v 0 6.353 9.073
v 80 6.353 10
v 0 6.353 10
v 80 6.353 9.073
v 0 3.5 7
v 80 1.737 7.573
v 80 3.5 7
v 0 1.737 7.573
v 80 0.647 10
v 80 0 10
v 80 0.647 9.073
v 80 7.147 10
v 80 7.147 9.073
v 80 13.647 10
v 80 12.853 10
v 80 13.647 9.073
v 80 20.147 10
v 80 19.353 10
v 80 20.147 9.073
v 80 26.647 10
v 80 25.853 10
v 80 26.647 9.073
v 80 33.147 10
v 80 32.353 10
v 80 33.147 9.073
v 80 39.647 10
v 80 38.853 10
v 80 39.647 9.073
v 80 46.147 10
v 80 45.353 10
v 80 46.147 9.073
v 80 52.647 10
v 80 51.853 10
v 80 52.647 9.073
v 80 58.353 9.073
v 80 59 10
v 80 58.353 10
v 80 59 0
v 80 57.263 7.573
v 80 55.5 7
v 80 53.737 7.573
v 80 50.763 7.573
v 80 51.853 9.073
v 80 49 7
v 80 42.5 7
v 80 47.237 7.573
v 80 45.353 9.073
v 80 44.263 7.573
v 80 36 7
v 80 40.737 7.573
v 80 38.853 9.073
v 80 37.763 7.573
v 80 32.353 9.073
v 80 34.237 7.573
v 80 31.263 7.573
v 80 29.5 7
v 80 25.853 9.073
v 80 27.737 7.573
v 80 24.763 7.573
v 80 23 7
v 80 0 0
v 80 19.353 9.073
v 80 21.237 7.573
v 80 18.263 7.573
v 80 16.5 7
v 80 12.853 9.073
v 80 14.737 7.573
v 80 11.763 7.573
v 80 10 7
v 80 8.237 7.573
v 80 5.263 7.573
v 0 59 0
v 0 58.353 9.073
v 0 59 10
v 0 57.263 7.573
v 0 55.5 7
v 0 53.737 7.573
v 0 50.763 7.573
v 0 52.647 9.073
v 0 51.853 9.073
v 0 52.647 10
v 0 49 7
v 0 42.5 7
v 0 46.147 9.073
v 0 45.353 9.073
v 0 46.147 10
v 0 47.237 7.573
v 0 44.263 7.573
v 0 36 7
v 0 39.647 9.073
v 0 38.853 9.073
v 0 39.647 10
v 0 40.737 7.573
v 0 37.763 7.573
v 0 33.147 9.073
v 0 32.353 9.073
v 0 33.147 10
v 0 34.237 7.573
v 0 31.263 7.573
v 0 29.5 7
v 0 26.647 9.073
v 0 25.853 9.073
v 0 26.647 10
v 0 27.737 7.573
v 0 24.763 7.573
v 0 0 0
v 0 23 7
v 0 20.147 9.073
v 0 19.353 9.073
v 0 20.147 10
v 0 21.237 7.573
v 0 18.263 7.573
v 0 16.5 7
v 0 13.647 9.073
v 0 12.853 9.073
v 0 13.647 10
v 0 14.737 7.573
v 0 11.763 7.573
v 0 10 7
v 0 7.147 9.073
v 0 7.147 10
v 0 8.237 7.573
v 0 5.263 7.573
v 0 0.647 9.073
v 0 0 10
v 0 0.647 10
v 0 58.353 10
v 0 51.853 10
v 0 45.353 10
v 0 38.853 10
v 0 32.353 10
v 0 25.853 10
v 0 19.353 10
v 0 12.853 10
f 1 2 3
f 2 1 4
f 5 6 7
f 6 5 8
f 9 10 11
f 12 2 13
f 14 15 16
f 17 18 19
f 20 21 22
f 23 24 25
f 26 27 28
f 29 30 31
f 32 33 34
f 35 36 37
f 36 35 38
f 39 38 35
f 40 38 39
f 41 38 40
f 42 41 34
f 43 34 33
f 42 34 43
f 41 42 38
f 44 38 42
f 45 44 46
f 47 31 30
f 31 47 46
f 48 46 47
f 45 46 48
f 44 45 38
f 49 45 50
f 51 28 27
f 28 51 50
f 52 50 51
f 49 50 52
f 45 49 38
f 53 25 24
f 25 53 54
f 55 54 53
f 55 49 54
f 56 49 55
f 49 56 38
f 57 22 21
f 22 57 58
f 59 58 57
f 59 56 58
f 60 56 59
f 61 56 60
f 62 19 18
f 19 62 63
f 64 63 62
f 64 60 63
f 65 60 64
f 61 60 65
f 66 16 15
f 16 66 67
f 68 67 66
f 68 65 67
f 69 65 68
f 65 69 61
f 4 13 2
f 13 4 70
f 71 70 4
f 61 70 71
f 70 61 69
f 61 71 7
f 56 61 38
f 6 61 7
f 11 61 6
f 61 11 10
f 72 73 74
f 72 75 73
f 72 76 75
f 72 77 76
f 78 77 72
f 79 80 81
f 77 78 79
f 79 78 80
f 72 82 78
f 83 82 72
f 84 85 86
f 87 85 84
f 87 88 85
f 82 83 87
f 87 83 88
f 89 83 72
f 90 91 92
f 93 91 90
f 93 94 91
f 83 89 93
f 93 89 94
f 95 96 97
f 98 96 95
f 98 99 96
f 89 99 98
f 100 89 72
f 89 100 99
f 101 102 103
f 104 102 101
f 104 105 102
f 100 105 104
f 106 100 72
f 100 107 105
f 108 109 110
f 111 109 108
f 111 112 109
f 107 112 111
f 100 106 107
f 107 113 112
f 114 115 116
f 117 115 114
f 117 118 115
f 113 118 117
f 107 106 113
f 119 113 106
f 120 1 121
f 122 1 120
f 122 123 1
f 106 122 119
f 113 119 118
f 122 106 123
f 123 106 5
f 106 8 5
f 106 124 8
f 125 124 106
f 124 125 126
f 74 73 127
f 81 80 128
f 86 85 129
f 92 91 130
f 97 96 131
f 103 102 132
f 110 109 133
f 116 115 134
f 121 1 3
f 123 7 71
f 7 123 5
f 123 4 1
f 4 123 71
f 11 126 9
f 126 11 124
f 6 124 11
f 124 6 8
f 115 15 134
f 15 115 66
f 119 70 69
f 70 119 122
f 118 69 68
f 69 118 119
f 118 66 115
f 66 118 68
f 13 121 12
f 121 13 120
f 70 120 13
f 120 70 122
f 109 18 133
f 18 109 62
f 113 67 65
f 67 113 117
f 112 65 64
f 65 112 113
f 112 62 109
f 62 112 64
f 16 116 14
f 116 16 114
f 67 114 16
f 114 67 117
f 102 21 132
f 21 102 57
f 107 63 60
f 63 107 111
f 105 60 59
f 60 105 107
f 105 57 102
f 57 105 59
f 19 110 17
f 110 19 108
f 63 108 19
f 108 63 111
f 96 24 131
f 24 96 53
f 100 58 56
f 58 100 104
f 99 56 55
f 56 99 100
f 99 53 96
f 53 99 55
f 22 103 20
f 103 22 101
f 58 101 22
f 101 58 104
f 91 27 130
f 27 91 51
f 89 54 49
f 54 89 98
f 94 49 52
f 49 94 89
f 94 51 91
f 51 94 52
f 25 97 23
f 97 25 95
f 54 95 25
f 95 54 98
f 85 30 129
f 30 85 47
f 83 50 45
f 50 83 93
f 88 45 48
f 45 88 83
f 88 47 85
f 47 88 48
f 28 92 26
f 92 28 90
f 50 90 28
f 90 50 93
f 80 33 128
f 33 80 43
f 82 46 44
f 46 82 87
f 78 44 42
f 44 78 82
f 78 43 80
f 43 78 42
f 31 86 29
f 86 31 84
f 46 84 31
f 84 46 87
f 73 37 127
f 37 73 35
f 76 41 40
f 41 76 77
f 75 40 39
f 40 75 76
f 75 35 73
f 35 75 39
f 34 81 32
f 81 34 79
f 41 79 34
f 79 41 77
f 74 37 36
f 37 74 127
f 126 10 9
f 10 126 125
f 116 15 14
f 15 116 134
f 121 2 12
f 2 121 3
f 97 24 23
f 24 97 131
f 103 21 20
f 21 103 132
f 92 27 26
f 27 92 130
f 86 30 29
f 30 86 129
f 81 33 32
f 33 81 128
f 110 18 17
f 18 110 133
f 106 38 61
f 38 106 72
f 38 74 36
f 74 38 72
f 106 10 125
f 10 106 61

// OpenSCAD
height = 60;
width = 80;
thick = 10;
logSize = 3;
logDepth = 3;
logSpace = .5;

// Calculations
logCount = round(height/((logSize*2)+logSpace));
echo(logCount);

actualHight = (logCount*((logSize*2)+logSpace))+logSpace;
echo(actualHight);

// Object
difference(){
	cube([width, actualHight, thick]);
	for (i = [0 : logCount-1]){
		translate([0,(logSize*2*i)+(logSpace*i)+logSize+logSpace,thick+(logSize-logDepth)]) 
			rotate([0,90,0]) cylinder(h=width, r=logSize);
	}
}
